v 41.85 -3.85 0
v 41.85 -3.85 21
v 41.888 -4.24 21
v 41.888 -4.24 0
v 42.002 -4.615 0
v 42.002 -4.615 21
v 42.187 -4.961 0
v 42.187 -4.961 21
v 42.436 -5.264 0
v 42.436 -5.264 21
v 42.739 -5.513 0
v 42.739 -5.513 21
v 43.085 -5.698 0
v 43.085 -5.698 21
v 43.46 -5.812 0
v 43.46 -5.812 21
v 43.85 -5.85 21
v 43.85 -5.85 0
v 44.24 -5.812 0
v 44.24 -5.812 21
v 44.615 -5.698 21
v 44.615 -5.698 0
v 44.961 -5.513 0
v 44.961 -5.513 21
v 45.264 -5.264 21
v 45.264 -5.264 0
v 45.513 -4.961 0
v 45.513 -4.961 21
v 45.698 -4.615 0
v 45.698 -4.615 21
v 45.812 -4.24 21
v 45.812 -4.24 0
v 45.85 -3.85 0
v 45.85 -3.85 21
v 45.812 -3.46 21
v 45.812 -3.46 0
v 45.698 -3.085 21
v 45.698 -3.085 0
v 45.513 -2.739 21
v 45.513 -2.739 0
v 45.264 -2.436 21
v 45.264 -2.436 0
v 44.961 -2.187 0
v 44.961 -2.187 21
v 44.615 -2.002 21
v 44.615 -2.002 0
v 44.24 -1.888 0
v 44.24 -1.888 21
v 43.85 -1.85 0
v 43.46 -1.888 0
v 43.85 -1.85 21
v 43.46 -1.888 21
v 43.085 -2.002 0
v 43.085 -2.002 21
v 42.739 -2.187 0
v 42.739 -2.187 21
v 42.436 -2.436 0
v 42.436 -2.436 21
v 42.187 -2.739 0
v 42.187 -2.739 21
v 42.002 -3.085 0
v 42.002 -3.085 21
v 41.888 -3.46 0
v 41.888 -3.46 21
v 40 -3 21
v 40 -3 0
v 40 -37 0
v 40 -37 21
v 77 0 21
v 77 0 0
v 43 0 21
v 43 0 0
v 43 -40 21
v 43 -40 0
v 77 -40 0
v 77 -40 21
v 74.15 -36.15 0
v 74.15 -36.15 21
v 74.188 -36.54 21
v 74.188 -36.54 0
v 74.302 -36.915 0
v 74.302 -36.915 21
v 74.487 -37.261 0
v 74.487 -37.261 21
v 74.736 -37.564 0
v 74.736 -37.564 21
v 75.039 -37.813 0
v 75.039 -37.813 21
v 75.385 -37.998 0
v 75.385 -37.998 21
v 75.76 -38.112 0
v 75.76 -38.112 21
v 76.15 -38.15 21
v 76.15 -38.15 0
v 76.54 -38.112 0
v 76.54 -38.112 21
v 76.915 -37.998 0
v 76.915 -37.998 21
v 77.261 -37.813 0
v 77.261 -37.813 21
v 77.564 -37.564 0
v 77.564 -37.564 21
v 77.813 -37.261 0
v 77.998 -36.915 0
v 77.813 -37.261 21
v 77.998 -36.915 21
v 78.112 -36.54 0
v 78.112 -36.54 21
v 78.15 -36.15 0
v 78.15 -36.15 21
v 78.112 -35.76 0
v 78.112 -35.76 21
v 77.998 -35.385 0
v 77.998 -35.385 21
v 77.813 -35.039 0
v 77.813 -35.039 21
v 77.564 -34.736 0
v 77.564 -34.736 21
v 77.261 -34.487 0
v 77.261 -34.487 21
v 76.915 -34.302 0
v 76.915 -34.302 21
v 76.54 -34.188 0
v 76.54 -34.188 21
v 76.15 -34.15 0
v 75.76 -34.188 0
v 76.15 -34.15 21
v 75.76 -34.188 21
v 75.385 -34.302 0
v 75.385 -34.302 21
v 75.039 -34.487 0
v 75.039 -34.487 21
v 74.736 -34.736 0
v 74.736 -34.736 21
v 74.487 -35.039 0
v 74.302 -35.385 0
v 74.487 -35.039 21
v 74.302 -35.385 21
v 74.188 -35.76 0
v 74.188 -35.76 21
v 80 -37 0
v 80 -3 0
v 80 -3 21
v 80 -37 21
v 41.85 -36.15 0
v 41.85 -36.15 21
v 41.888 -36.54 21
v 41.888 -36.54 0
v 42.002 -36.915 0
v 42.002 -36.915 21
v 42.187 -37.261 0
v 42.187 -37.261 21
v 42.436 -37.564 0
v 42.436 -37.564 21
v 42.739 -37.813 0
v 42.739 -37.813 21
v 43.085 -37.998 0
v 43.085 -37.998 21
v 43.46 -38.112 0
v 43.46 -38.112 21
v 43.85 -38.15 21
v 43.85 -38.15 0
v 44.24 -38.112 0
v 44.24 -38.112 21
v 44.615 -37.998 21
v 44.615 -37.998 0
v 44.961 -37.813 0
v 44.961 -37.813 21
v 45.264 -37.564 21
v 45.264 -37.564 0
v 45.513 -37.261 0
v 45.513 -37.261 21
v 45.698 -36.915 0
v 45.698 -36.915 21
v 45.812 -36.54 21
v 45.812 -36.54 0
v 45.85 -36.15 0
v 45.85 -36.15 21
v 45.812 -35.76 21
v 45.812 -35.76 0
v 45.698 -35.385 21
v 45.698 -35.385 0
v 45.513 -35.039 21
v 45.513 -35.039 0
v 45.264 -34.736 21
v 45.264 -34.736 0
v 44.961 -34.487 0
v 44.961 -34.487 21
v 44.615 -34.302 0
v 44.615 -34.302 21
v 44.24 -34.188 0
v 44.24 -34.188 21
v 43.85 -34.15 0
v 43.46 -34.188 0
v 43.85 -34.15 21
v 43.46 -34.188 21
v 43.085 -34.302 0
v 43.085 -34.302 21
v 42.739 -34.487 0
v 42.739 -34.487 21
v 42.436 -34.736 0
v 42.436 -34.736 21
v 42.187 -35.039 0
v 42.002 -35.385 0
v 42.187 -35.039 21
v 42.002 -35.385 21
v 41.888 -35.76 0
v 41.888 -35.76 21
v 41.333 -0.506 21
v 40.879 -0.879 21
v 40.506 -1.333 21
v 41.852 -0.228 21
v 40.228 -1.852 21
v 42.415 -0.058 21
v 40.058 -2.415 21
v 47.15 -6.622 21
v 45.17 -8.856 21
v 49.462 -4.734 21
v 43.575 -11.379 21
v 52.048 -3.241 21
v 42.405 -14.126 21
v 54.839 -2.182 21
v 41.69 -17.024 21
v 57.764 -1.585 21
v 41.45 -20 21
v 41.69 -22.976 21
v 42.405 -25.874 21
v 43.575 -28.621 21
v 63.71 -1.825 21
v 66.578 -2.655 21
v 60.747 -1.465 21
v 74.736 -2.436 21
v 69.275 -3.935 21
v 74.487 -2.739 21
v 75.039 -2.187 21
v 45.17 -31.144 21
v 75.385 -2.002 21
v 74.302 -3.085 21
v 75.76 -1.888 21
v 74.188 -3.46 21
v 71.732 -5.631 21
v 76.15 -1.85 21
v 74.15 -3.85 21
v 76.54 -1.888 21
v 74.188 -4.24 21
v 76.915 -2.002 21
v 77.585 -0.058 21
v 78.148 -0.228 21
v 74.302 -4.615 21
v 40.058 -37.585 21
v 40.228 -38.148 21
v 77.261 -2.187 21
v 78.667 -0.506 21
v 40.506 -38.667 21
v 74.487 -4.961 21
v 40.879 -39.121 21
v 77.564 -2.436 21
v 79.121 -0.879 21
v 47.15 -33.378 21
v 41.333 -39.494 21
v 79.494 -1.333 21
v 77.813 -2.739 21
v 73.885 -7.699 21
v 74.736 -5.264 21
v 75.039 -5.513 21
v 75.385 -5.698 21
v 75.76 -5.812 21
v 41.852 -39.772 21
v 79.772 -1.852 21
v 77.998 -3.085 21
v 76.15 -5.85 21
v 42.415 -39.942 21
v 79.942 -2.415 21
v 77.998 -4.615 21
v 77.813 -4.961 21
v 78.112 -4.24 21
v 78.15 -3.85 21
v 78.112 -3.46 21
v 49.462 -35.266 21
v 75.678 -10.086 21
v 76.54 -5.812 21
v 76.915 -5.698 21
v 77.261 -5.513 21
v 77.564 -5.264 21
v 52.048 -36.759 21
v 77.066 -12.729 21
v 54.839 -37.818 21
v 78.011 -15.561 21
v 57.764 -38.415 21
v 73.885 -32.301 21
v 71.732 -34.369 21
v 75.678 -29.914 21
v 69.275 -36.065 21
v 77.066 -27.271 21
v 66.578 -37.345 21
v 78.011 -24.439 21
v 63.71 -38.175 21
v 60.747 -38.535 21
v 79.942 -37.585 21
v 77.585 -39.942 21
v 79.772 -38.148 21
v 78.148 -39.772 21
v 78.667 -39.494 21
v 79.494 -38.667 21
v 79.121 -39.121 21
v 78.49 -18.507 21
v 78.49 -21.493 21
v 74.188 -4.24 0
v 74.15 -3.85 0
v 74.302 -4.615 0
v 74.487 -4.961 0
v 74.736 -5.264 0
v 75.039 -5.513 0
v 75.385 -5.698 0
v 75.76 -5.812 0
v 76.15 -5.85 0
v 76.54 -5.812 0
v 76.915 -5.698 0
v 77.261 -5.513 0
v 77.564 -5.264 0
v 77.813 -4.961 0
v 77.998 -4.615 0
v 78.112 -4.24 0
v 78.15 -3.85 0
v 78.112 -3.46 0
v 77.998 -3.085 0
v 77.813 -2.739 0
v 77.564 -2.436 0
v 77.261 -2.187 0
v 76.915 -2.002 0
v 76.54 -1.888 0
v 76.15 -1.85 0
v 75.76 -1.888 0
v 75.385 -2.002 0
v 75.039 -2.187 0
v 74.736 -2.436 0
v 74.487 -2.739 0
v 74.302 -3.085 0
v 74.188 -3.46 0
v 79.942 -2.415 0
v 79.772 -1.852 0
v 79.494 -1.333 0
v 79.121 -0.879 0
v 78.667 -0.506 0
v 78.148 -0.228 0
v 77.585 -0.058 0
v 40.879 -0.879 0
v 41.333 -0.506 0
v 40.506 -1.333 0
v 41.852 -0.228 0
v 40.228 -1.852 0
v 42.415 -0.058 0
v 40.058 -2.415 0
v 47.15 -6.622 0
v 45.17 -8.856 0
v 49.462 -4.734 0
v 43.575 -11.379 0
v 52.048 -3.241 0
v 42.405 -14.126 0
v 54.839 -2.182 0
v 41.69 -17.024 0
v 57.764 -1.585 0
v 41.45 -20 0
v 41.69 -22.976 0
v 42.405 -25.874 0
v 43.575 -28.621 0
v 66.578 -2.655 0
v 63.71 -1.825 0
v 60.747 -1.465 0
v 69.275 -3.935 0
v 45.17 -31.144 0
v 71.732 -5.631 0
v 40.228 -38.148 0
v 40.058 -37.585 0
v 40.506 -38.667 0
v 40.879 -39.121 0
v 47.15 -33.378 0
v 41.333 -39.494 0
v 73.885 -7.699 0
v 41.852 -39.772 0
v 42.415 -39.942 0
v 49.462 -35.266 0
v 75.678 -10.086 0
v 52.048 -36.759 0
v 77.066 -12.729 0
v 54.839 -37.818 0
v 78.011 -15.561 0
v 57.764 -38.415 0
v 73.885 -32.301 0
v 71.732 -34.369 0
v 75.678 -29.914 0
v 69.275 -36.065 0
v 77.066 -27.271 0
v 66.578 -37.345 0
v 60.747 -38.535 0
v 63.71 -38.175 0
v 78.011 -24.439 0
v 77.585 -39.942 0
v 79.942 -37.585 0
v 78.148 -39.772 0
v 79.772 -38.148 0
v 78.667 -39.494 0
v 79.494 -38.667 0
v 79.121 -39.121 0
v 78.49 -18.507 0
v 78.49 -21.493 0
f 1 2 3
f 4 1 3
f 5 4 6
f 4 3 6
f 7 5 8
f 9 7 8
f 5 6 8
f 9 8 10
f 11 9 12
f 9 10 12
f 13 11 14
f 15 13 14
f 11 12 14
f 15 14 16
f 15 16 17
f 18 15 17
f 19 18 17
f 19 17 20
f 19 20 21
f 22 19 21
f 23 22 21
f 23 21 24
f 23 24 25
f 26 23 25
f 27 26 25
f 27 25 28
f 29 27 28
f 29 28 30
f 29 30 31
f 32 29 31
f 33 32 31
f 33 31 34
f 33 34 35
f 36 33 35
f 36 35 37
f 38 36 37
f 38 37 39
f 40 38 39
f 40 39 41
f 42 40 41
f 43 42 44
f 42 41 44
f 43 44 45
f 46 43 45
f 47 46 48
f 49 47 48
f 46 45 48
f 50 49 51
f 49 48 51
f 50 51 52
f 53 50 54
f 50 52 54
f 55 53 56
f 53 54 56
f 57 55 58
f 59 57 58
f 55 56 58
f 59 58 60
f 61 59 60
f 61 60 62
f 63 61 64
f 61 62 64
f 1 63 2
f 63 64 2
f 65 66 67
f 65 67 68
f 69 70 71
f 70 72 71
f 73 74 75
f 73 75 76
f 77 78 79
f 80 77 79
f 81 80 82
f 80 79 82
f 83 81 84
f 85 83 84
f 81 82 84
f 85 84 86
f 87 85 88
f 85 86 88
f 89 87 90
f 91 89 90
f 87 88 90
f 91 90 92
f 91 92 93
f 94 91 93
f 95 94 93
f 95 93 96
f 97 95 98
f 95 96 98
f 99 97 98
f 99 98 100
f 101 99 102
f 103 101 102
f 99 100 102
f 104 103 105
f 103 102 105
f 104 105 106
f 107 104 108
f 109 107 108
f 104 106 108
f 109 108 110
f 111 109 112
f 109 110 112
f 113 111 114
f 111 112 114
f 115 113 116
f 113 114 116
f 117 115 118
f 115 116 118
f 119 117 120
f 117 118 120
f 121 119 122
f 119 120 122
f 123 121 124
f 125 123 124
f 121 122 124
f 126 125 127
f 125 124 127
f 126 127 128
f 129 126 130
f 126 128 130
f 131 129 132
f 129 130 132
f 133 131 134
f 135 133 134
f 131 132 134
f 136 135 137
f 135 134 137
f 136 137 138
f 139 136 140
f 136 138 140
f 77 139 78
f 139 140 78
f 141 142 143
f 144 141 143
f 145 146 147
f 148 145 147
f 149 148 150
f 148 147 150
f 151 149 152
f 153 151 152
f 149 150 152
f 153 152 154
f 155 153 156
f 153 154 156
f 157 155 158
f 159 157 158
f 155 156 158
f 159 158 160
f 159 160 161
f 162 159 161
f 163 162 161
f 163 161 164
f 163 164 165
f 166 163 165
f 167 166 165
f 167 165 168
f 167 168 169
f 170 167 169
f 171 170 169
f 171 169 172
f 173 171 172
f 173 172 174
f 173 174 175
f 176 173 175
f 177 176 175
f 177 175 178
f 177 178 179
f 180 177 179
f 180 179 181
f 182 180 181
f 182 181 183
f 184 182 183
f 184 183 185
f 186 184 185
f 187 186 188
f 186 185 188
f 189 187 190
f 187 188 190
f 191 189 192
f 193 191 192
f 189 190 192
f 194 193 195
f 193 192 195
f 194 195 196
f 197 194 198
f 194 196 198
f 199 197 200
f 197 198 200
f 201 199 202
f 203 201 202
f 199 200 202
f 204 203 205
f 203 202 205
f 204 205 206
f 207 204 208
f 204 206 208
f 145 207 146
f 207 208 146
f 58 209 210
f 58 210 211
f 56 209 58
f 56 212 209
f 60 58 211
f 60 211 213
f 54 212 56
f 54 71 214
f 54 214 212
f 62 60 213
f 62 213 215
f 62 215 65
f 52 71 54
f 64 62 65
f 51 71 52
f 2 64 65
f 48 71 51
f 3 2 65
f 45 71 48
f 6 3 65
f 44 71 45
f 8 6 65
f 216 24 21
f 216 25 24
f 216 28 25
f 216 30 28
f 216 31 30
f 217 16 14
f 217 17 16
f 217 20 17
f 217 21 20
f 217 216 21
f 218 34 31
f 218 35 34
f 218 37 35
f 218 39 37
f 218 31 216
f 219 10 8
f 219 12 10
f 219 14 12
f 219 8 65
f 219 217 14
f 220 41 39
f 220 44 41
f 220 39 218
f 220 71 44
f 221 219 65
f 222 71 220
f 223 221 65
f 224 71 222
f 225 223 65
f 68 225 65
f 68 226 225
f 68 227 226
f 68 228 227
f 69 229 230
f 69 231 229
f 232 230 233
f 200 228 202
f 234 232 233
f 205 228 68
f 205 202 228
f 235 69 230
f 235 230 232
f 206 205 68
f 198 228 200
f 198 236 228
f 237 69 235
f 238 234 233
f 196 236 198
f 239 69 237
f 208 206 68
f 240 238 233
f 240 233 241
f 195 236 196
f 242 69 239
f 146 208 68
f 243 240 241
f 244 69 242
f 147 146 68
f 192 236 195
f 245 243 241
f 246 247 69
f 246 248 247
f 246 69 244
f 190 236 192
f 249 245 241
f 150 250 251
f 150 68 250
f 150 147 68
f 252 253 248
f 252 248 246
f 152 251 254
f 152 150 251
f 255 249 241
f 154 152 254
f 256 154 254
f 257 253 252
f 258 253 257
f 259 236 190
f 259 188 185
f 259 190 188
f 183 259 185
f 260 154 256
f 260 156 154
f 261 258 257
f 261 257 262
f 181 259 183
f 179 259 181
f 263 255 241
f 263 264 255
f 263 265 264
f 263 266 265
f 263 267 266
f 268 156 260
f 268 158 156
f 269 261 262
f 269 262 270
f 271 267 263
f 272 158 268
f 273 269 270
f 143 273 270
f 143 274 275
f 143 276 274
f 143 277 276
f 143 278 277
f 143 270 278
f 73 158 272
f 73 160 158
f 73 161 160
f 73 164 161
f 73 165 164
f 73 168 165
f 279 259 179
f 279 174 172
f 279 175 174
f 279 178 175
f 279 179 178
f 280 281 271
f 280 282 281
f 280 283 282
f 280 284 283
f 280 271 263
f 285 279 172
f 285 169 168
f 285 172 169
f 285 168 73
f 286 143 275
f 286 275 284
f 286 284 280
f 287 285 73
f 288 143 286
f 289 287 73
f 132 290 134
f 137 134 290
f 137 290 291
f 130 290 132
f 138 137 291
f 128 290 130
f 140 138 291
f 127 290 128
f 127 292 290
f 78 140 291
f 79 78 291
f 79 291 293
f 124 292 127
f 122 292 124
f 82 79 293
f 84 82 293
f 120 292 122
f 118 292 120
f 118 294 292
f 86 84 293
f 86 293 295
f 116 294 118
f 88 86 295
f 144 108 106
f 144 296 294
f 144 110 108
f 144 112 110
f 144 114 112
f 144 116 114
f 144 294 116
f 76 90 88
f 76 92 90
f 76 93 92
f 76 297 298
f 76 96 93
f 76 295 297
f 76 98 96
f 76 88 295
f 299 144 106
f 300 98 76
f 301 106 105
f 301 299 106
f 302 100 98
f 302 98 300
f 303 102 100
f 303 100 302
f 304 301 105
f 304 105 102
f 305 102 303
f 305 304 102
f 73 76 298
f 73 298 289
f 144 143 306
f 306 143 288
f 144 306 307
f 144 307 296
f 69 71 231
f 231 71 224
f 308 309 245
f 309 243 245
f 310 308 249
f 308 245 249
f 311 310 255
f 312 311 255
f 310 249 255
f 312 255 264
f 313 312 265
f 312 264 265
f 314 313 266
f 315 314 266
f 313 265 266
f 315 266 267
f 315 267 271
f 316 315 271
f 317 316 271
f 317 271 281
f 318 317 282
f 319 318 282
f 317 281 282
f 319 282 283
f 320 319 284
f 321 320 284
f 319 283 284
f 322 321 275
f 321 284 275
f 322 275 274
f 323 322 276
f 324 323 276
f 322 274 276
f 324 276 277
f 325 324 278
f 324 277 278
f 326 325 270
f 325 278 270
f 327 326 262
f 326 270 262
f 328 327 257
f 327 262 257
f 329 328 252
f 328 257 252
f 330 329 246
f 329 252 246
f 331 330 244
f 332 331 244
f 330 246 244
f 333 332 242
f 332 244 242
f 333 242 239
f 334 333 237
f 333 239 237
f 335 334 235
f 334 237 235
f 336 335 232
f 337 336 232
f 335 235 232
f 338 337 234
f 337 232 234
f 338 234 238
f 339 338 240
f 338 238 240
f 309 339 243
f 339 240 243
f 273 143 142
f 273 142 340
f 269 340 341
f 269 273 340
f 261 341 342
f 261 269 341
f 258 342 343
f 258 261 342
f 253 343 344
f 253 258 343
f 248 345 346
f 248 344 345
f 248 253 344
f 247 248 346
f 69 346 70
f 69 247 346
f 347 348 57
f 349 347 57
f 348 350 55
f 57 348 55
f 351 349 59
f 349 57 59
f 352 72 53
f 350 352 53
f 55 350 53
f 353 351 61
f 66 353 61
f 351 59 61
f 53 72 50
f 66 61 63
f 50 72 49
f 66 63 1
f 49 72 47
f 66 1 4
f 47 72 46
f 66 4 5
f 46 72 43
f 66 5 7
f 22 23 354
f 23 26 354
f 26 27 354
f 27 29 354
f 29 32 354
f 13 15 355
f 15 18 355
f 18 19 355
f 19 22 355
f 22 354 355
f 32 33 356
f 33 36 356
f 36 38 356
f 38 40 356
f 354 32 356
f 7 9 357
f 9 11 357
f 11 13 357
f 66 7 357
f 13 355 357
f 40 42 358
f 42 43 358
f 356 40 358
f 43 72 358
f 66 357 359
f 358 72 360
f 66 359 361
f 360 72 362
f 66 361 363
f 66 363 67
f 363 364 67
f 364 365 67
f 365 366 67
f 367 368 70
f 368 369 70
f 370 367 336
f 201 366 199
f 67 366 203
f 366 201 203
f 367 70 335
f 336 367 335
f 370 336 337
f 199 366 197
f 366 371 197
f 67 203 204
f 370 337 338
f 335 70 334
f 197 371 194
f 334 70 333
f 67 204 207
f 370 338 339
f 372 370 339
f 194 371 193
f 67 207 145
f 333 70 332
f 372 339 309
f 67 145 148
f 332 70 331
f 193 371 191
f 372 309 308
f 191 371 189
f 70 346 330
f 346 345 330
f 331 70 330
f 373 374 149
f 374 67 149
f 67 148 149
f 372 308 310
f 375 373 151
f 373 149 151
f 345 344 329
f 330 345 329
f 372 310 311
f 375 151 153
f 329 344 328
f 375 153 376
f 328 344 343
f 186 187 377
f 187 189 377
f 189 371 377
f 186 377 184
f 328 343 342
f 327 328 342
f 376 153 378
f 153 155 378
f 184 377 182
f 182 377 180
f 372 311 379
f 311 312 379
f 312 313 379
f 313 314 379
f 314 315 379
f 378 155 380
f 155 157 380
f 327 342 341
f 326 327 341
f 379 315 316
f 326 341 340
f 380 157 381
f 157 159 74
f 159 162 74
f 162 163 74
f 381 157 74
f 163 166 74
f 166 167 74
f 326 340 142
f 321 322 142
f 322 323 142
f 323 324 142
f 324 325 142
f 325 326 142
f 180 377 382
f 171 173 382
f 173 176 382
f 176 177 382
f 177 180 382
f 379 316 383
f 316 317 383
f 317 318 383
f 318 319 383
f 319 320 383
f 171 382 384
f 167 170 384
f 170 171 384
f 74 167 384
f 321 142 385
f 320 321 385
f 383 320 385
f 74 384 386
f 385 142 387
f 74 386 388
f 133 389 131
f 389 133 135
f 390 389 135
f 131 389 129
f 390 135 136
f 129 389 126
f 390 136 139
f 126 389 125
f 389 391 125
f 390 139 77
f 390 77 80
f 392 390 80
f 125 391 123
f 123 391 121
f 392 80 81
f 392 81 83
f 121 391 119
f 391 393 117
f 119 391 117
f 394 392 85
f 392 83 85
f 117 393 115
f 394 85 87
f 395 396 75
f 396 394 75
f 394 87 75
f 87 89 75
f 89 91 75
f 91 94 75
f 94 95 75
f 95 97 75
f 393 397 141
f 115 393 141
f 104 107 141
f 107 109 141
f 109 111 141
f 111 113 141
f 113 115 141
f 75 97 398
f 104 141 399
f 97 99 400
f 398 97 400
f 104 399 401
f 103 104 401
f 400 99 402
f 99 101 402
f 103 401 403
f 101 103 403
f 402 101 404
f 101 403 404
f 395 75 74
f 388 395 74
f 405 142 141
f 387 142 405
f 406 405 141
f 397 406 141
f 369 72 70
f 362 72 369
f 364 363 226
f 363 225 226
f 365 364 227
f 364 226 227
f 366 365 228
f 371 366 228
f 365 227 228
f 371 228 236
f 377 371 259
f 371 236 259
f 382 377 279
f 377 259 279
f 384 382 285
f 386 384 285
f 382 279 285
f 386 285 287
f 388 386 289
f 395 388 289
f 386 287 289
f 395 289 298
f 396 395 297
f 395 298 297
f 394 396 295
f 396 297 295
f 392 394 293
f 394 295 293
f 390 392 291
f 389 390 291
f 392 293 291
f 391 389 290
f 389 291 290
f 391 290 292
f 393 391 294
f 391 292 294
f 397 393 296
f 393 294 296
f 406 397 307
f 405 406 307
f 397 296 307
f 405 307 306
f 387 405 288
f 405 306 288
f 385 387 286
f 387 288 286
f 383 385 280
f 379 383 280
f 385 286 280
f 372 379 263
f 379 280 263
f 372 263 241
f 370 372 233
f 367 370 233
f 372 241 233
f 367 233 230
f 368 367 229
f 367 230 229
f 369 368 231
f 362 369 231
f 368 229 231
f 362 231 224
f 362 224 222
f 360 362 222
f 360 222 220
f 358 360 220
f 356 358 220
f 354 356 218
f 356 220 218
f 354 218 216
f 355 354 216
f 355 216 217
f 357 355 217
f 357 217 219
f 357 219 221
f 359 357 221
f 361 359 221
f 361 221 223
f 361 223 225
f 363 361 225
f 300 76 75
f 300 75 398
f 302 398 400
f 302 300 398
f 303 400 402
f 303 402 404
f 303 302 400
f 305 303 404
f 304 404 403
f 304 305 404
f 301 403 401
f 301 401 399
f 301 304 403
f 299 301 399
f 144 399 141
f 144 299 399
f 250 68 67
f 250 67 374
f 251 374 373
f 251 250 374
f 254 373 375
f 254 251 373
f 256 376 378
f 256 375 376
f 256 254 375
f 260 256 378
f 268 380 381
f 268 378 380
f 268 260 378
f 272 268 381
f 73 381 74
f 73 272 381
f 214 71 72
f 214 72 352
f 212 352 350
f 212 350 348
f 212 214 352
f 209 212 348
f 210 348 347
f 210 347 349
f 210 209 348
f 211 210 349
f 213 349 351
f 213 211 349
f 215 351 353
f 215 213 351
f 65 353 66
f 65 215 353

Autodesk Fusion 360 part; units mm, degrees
box "BoxPrimitive1" add length 40 width 40 height 21 placed x (0, -1, 0) y (1, 0, 0) z (0, 0, 1) at (40, 0, 0)
fillet "Fillet1" radius 3 4 edges at (40, -40, 10.5) (80, -40, 10.5) (80, 0, 10.5) (40, 0, 10.5)
sketch "Sketch2" plane through (0, 0, 21) normal (0, 0, 1) x (-1, 0, 0)
  arc A0 (-43, 0) -> (-40, 3) centre (-43, 3) ccw
  line L0 (-40, 3) -> (-40, 37)
  arc A1 (-40, 37) -> (-43, 40) centre (-43, 37) ccw
  line L1 (-43, 40) -> (-77, 40)
  arc A2 (-77, 40) -> (-80, 37) centre (-77, 37) ccw
  line L2 (-80, 37) -> (-80, 3)
  arc A3 (-80, 3) -> (-77, 0) centre (-77, 3) ccw
  line L3 (-77, 0) -> (-43, 0)
  circle A4 centre (-76.15, 36.15) radius 2
  circle A5 centre (-76.15, 3.85) radius 2
  circle A6 centre (-43.85, 36.15) radius 2
  circle A7 centre (-43.85, 3.85) radius 2
  line L4 (-40.8787, 0.8787) -> (-79.1213, 39.1213) construction
  line L5 (-40.8787, 39.1213) -> (-79.1213, 0.8787) construction
  circle A8 centre (-60, 20) radius 18.55
  dimension "d8" = 4
  dimension "d9" = 4
  dimension "d10" = 4
  dimension "d11" = 4
  dimension "d12" = 3.85
  dimension "d13" = 3.85
  dimension "d14" = 3.85
  dimension "d15" = 3.85
  dimension "d16" = 3.85
  dimension "d17" = 3.85
  dimension "d18" = 3.85
  dimension "d19" = 3.85
  dimension "d23" = 37.1
extrude "Extrude1" cut sketch "Sketch2" against normal blind 35 contours A4 | A5 | A6 | A7
extrude "Extrude2" cut sketch "Sketch2" against normal blind 35 contours A8
equation "d12 = screw_spacing"
equation "d13 = screw_spacing"
equation "d14 = screw_spacing"
equation "d15 = screw_spacing"
equation "d16 = screw_spacing"
equation "d17 = screw_spacing"
equation "d18 = screw_spacing"
equation "d19 = screw_spacing"
equation "screw_spacing = 3.85 mm"
